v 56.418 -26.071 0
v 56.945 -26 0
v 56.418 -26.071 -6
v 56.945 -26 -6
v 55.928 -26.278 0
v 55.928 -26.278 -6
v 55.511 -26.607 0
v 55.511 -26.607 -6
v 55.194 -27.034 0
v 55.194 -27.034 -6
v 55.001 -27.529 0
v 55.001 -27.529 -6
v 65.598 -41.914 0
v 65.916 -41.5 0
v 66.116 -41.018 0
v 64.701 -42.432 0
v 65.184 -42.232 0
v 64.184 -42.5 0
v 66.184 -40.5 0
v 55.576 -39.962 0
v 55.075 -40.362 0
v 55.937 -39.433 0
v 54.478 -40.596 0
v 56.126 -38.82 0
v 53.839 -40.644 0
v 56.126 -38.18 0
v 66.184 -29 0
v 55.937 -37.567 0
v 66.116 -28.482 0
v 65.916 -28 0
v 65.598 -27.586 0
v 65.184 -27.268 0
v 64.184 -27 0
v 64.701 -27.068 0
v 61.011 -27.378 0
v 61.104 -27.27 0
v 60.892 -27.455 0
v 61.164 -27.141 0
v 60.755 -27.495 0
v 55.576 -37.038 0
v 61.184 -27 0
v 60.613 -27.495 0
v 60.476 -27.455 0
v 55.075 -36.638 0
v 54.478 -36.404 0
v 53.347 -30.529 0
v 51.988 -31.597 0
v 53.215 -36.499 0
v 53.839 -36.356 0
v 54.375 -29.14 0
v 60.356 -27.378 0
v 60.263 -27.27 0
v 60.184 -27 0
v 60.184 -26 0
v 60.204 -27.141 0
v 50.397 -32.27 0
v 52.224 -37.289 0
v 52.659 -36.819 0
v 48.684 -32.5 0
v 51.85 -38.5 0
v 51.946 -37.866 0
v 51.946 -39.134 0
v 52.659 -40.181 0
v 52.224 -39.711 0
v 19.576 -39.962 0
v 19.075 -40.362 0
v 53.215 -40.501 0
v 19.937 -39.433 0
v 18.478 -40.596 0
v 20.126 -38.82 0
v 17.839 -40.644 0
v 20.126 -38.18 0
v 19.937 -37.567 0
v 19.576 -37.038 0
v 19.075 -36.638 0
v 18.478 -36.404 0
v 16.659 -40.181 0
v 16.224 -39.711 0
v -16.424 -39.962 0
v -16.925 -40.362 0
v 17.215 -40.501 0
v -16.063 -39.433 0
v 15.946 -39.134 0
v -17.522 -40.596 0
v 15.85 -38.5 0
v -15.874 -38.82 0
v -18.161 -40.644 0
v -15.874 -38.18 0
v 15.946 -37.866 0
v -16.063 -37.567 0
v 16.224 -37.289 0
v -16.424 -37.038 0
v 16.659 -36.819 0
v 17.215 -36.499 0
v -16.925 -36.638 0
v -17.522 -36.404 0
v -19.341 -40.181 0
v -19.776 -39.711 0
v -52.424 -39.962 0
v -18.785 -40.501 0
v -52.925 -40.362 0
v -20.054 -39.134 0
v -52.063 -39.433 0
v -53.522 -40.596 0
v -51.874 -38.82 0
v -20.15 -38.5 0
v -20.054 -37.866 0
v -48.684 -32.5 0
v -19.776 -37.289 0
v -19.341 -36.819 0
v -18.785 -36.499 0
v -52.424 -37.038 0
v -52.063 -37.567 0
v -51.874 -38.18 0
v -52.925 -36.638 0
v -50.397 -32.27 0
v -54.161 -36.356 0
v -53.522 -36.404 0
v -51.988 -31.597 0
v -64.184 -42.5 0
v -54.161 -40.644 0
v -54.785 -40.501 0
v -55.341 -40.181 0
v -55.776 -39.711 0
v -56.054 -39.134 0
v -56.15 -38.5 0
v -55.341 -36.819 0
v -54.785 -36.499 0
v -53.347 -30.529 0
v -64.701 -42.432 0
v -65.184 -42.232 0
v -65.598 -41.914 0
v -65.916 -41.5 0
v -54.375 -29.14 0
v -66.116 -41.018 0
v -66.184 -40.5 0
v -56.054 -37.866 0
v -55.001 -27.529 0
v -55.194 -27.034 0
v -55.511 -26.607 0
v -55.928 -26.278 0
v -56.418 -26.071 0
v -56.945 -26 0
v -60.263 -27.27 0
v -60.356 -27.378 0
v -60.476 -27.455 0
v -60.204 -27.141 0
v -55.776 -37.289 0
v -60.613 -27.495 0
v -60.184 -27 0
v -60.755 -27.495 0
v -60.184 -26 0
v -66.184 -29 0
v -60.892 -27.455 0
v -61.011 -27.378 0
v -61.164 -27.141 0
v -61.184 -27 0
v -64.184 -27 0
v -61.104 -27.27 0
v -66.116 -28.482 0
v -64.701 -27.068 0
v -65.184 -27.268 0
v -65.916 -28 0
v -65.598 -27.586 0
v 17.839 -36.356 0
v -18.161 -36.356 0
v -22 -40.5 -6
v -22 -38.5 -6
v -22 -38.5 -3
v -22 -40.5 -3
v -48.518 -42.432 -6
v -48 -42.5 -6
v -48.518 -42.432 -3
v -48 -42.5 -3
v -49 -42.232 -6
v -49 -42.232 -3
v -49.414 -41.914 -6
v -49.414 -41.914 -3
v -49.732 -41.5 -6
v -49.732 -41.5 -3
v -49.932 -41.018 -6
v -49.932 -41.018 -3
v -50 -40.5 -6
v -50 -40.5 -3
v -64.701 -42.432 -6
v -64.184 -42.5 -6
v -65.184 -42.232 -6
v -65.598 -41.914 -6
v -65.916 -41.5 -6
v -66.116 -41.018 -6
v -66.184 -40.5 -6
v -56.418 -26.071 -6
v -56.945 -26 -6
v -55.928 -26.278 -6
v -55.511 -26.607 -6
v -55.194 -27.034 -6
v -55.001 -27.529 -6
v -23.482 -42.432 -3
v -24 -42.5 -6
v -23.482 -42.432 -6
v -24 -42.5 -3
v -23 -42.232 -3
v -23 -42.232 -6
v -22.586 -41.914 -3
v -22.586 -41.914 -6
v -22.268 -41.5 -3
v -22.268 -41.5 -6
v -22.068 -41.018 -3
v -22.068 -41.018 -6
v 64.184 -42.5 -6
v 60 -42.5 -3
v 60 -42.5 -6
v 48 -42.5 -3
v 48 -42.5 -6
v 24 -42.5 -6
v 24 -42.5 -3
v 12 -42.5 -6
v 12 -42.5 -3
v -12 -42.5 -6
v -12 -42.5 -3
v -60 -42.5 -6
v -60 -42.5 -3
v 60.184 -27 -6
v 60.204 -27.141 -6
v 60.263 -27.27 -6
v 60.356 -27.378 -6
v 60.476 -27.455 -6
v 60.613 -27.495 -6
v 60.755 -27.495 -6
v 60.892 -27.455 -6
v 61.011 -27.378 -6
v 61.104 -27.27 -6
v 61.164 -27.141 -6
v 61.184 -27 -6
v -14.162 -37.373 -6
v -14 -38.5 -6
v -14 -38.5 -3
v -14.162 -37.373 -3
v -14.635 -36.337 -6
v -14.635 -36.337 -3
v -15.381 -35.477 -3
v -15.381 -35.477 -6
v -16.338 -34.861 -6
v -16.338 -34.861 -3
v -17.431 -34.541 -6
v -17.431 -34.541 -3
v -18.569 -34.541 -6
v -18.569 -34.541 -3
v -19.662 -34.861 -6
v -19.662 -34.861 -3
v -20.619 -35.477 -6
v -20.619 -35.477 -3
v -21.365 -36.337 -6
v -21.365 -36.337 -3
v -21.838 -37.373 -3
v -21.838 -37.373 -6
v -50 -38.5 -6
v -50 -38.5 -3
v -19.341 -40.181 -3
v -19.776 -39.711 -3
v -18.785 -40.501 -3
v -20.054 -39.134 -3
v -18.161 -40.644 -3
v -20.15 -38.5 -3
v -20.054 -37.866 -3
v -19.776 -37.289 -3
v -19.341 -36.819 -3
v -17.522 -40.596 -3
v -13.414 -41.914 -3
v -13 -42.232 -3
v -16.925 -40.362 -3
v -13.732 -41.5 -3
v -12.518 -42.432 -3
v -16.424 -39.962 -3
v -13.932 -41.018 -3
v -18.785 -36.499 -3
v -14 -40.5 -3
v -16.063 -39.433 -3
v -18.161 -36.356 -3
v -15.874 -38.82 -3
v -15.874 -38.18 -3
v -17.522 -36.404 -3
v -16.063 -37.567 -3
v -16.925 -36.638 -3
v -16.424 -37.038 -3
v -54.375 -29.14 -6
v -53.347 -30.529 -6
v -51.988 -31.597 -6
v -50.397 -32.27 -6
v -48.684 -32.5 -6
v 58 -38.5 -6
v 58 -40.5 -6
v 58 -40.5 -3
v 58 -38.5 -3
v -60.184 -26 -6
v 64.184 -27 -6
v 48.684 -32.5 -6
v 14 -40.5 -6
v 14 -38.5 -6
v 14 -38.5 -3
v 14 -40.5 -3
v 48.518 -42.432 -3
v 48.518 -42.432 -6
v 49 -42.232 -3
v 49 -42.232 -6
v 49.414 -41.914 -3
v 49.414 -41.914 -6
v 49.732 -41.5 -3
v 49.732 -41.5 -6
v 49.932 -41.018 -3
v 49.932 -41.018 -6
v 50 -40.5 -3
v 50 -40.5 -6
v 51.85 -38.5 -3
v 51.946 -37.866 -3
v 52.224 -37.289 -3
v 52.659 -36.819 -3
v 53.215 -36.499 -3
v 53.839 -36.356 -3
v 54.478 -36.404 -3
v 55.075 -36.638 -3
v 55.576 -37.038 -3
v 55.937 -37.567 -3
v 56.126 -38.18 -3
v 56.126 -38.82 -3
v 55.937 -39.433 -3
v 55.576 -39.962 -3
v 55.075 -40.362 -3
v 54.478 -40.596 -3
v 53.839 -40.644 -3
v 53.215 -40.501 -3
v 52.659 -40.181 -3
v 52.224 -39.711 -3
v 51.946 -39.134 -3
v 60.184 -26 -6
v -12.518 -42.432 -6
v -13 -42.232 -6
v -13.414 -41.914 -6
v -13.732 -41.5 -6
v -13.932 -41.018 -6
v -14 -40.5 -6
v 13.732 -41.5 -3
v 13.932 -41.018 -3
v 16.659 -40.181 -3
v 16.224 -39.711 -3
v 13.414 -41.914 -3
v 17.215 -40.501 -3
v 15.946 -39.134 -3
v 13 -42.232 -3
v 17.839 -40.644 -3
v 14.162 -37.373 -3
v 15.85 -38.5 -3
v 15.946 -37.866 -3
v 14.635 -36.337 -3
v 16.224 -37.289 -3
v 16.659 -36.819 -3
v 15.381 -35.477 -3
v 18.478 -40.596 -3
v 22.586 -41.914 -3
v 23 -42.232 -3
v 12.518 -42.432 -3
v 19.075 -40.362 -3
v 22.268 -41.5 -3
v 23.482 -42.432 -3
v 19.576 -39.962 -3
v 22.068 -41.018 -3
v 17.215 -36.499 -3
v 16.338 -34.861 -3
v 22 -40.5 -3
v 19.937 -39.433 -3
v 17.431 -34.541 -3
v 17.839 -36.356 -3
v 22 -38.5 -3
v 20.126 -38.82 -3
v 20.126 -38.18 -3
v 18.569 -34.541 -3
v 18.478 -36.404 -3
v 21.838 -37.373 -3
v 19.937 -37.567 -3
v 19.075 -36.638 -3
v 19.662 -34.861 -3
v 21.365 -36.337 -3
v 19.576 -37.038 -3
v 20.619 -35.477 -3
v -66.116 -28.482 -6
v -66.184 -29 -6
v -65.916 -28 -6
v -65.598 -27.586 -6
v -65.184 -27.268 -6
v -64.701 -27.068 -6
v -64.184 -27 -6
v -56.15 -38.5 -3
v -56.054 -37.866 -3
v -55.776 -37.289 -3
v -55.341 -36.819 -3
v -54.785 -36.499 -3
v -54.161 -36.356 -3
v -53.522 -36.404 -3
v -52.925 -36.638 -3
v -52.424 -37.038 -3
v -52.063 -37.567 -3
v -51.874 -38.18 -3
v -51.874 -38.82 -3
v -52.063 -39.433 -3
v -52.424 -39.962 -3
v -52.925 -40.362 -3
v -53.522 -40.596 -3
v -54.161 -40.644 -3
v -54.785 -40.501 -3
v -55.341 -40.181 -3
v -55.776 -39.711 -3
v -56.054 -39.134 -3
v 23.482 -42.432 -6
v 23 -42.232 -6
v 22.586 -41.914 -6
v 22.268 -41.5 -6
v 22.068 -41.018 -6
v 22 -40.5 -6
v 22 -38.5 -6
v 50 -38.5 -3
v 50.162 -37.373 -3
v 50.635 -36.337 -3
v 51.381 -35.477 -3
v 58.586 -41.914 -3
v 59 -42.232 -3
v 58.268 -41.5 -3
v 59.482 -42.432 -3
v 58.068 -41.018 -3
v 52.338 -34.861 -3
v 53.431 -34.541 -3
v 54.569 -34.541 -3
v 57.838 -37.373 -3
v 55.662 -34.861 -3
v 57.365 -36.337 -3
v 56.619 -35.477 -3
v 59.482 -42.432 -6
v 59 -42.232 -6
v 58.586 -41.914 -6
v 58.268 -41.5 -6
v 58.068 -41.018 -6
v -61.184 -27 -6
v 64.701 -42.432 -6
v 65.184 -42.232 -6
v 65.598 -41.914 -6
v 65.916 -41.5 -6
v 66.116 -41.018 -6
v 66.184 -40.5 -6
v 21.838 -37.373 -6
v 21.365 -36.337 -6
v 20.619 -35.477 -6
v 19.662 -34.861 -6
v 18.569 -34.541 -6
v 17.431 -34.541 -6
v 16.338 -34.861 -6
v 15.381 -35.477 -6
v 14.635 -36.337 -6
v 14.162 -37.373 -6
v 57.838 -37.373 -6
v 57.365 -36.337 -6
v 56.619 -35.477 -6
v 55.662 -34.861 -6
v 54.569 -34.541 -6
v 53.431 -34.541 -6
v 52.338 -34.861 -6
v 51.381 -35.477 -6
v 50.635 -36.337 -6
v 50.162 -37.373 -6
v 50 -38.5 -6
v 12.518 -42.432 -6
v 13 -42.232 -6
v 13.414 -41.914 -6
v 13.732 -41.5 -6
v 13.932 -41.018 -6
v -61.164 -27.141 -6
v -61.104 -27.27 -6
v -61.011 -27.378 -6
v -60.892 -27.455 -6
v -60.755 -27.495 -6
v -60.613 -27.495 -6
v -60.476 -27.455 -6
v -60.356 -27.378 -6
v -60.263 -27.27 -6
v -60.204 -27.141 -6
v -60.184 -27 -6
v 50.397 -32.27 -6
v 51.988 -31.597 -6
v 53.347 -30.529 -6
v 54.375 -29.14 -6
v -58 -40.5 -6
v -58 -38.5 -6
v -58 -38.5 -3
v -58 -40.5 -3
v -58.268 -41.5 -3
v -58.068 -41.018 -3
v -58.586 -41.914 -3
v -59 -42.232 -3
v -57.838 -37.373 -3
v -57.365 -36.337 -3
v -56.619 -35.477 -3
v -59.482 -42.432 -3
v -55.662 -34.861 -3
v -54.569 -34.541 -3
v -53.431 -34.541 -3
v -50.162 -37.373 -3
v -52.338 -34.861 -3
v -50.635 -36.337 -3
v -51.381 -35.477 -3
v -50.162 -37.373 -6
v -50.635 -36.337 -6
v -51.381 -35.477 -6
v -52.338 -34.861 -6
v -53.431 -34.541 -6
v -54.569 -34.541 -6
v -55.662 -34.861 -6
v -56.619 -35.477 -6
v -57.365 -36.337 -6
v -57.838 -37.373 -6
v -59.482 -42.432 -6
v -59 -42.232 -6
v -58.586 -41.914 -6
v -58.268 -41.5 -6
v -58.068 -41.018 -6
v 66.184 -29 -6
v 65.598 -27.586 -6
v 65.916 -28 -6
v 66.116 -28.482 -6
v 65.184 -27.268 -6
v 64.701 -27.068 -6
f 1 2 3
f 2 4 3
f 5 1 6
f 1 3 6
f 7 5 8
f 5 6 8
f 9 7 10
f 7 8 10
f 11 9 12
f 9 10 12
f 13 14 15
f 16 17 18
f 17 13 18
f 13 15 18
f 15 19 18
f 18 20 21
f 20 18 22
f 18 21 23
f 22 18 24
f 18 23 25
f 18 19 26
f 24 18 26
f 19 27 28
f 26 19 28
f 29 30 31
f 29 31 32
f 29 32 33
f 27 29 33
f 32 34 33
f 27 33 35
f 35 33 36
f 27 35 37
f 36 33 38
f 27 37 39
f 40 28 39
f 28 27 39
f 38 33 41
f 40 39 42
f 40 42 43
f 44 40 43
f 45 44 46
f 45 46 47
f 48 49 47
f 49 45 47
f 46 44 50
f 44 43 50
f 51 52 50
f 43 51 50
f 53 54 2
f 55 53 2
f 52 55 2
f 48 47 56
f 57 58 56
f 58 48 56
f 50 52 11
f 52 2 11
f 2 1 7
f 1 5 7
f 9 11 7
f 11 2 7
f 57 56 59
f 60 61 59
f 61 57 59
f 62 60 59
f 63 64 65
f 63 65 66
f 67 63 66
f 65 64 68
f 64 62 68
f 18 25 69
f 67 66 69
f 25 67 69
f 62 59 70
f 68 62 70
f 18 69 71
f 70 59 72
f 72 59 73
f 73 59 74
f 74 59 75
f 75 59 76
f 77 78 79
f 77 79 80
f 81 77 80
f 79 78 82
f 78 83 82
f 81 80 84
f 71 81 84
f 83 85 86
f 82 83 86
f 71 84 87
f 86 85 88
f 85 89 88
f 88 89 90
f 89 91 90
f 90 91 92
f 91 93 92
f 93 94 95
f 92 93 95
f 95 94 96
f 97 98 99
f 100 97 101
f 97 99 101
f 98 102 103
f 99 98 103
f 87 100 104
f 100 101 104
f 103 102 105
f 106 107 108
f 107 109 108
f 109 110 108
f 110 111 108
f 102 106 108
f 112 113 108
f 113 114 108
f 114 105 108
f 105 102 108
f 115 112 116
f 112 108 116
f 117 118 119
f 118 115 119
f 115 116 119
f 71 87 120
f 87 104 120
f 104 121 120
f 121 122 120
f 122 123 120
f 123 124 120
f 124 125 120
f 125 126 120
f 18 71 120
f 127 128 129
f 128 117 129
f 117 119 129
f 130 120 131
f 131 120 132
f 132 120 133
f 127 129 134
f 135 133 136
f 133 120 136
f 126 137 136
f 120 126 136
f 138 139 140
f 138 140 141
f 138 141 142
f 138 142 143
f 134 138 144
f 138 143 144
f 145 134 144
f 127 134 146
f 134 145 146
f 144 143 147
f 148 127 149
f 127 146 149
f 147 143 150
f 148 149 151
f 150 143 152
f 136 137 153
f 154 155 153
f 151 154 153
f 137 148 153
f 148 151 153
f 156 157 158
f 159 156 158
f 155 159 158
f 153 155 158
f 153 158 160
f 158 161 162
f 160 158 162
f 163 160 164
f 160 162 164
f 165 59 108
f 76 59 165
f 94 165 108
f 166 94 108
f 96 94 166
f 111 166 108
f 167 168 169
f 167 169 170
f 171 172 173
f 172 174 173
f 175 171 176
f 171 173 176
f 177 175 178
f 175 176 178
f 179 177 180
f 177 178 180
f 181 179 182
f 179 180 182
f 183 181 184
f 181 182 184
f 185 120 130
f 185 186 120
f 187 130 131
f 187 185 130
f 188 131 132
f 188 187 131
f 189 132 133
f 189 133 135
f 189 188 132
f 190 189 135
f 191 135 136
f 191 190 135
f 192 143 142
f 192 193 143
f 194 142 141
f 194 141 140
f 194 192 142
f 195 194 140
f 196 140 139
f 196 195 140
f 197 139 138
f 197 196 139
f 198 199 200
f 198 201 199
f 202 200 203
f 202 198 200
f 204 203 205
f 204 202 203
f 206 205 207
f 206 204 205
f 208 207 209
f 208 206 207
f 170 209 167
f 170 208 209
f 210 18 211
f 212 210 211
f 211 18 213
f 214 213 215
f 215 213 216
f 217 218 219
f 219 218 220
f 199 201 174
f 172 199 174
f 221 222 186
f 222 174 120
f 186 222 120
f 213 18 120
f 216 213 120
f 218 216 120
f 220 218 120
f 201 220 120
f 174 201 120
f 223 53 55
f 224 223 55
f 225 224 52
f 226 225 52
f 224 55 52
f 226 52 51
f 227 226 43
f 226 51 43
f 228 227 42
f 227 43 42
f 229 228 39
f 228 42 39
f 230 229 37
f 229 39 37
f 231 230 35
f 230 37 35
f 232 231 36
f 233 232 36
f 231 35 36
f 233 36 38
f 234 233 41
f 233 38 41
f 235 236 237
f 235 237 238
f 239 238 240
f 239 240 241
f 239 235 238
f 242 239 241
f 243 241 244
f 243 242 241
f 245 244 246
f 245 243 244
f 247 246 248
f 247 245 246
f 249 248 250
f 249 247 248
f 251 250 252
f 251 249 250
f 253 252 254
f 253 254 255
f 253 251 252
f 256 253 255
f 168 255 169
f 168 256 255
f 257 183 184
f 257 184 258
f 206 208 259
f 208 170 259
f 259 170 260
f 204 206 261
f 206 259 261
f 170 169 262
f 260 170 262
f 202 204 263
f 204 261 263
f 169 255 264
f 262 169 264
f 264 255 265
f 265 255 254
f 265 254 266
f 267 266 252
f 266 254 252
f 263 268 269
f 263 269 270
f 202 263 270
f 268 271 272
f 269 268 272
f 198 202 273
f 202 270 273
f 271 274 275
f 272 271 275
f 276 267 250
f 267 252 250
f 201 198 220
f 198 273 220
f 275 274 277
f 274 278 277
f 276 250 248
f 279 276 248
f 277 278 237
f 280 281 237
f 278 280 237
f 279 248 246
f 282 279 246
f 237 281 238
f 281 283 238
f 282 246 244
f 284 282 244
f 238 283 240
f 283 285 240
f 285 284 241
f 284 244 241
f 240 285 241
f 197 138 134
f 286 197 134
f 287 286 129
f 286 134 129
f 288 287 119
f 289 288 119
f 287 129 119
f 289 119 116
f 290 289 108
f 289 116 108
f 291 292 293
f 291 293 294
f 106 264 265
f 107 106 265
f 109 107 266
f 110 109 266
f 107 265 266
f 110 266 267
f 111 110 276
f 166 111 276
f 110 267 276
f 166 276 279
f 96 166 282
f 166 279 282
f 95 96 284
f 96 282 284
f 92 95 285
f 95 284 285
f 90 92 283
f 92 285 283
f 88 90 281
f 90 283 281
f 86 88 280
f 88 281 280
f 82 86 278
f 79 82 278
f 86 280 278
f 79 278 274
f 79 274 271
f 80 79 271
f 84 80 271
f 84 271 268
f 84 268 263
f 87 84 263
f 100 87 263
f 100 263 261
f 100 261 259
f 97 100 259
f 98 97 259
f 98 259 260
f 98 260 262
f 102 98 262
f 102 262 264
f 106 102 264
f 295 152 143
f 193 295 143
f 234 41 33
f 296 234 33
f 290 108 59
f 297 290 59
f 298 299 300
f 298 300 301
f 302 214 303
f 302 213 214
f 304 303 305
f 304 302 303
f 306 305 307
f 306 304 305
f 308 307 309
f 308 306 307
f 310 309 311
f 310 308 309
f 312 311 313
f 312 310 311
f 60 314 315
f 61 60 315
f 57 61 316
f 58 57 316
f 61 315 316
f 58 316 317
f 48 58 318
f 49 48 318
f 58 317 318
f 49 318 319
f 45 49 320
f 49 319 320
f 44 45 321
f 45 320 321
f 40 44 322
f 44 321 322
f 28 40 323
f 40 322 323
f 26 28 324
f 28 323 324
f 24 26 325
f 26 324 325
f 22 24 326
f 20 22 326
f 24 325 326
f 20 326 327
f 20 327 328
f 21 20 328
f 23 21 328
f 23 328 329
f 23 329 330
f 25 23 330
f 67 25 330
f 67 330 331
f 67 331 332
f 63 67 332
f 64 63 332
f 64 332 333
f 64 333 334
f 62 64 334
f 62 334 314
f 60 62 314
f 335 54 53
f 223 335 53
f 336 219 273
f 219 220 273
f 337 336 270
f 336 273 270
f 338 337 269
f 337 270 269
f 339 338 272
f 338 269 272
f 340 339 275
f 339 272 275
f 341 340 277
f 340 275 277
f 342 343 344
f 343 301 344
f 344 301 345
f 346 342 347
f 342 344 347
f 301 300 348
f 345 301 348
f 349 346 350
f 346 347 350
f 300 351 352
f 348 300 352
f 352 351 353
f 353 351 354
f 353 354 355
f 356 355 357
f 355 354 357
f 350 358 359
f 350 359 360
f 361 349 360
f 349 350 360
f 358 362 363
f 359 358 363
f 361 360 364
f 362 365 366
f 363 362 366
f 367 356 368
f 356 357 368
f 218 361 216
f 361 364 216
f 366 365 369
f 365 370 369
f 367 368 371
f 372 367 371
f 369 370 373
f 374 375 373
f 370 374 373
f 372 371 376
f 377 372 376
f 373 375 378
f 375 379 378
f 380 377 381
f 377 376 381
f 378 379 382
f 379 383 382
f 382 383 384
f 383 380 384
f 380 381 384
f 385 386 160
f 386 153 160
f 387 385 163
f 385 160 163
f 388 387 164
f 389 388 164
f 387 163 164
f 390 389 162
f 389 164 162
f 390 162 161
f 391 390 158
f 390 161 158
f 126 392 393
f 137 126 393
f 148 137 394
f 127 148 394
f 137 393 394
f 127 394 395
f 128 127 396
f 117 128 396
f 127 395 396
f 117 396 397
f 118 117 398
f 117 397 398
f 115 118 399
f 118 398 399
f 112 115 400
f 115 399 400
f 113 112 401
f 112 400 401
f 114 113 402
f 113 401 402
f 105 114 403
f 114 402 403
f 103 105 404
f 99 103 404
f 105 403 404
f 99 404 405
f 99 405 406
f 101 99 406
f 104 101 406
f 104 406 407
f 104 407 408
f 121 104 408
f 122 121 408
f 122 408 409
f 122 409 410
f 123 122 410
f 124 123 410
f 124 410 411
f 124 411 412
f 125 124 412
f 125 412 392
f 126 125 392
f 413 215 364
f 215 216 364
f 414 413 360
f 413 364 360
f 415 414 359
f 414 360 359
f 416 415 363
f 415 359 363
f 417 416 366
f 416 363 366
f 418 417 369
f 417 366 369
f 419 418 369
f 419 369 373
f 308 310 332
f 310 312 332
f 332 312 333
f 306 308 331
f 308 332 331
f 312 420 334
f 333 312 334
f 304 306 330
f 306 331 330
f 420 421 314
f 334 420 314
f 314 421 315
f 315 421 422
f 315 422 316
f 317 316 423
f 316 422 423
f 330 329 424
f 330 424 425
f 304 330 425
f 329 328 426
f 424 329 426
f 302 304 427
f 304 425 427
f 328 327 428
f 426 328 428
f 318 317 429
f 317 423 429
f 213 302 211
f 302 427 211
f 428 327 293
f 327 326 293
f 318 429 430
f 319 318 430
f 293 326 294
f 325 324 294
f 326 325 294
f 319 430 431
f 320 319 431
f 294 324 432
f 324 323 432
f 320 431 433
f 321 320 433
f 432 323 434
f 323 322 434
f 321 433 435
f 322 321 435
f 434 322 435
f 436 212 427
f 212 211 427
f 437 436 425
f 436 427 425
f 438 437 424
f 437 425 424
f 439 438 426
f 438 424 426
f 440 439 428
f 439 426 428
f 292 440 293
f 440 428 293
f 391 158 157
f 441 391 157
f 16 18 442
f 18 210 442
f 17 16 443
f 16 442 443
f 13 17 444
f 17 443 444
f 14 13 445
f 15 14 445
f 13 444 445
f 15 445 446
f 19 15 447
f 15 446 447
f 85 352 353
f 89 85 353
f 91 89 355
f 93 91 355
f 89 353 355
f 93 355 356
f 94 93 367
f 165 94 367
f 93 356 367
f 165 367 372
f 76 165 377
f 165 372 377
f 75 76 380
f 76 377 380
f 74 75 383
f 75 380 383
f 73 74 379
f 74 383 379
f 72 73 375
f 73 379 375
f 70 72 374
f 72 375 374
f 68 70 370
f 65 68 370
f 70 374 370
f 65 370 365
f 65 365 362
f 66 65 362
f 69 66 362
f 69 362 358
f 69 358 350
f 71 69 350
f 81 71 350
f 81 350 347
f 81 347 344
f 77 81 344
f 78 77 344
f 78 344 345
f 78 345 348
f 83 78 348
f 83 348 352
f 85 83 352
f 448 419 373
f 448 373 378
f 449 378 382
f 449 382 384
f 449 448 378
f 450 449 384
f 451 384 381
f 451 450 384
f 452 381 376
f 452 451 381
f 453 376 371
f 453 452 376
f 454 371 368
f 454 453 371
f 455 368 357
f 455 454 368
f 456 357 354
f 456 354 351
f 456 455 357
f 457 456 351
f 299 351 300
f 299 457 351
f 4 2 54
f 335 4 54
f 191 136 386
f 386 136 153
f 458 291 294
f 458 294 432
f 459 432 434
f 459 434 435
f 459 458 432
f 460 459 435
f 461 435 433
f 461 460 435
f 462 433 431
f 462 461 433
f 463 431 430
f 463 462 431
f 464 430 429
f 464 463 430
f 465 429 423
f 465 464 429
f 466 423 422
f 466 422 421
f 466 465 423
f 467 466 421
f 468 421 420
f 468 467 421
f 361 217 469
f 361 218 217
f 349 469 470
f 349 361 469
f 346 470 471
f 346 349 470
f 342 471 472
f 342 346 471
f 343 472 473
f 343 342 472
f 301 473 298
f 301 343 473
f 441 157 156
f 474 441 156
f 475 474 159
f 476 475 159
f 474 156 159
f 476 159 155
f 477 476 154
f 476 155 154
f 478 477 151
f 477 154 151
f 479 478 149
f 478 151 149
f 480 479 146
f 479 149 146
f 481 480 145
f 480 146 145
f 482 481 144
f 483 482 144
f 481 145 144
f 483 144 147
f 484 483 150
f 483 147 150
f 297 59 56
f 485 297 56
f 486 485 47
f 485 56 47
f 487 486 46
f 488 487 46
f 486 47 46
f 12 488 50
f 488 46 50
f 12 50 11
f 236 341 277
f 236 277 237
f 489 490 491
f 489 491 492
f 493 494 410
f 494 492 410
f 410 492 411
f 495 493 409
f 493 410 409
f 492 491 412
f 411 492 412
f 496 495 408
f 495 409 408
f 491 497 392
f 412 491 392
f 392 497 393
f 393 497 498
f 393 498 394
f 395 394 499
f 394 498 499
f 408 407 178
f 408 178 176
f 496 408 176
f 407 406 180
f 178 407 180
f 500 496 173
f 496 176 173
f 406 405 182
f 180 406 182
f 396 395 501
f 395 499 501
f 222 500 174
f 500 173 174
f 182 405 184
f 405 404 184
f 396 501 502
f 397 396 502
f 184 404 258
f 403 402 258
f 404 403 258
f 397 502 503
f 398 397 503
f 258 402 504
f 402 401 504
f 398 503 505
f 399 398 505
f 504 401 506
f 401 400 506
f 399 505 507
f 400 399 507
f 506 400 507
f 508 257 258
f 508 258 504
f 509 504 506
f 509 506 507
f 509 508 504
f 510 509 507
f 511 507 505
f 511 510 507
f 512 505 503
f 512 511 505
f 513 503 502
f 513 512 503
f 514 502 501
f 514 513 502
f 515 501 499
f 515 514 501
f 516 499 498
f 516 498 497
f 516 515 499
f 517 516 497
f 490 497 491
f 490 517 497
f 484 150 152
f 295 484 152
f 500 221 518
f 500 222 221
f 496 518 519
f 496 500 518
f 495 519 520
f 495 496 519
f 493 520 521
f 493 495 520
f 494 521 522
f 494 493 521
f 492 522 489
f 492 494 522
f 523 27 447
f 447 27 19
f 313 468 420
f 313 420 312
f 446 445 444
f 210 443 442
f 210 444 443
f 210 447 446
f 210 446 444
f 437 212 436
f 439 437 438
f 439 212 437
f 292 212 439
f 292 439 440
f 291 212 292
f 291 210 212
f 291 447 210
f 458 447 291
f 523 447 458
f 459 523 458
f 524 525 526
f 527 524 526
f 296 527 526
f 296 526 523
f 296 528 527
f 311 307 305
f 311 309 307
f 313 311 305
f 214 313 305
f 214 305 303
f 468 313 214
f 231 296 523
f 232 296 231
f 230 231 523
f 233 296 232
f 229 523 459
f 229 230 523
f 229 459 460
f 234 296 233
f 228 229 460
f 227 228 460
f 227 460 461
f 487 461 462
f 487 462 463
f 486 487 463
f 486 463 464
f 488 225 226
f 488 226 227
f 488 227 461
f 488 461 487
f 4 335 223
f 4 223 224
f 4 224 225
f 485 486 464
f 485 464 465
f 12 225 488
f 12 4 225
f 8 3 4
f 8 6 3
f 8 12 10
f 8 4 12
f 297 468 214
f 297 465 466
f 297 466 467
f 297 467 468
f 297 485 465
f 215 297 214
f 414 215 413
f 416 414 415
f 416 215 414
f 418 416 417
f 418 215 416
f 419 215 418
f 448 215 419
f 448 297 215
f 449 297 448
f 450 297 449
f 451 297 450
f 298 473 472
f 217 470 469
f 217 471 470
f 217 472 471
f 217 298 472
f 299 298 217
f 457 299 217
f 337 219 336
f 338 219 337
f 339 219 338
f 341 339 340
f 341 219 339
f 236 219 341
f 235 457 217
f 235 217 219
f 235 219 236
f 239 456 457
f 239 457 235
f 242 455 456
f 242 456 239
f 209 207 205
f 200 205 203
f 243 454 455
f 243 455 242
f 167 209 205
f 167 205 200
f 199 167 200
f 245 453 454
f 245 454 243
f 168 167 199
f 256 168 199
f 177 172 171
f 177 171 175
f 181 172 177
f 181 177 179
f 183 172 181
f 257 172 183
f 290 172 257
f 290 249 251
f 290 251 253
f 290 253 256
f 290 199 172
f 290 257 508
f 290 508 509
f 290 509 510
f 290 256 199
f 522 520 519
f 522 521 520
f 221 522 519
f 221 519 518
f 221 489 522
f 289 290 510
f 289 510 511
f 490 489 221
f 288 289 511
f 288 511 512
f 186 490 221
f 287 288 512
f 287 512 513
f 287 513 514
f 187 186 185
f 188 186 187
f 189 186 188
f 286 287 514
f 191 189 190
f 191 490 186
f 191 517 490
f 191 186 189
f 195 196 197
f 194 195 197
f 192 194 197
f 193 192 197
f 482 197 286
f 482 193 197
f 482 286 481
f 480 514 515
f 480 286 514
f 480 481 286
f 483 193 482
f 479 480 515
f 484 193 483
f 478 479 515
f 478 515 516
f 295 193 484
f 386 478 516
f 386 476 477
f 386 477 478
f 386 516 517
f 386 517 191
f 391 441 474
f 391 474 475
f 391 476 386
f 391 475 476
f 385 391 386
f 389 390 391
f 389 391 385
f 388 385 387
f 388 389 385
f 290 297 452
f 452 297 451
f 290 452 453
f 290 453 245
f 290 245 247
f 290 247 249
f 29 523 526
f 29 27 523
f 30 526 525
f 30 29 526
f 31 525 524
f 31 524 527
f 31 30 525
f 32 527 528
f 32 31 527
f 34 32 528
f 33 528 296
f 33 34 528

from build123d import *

# Parameters (mm, degrees)
EXTRUDE_1_DEPTH     = 6
CUT_EXTRUDE_START   = -6
CUT_EXTRUDE_1_DEPTH = 1
CUT_EXTRUDE_3_DEPTH = 3
SKETCH_5_OUTSIDE_W  = 281.366
SKETCH_5_OUTSIDE_H  = 83.498
CUT_EXTRUDE_2_DEPTH = 124.858535656
HOLE_WIZARD_M4_1_D  = 4.3
FILLET_3_R          = 2


with BuildPart() as part:
    # ｽｹｯﾁ1 → ﾎﾞｽ - 押し出し1 (new body)
    with BuildSketch(Plane.XY):
        with BuildLine():
            Line((-74.445215618, -8), (-65.183849372, -8))
            ThreePointArc((-65.183849372, -8), (-59.472431605, -21.788582233), (-45.683849372, -27.5))
            Line((-45.683849372, -27.5), (45.683849372, -27.5))
            ThreePointArc((45.683849372, -27.5), (59.472431605, -21.788582233), (65.183849372, -8))
            Line((65.183849372, -8), (74.445215618, -8))
            ThreePointArc((74.445215618, -8), (83.886790831, -21.023796042), (99.183849372, -26))
            Line((99.183849372, -26), (116.183849372, -26))
            Line((116.183849372, -26), (116.183849372, -34))
            Line((116.183849372, -34), (66.183849372, -42.5))
            Line((66.183849372, -42.5), (-66.183849372, -42.5))
            Line((-66.183849372, -42.5), (-116.183849372, -34))
            Line((-116.183849372, -34), (-116.183849372, -26))
            Line((-116.183849372, -26), (-99.183849372, -26))
            ThreePointArc((-99.183849372, -26), (-83.886790831, -21.023796042), (-74.445215618, -8))
        make_face()
    extrude(amount=-EXTRUDE_1_DEPTH)

    # ｽｹｯﾁ1<5> → ｶｯﾄ - 押し出し1 (cut)
    with BuildSketch(Plane.XY.offset(CUT_EXTRUDE_START)):
        with BuildLine():
            Line((-66.183849372, -8), (-72.183849372, -8))
            Line((-72.183849372, -8), (-72.183849372, -27))
            Line((-72.183849372, -27), (-116.183849372, -27))
            Line((-116.183849372, -27), (-116.183849372, -33))
            Line((-116.183849372, -33), (-72.183849372, -33))
            Line((-72.183849372, -33), (-72.183849372, -34))
            ThreePointArc((-72.183849372, -34), (-71.183849372, -35), (-70.183849372, -34))
            Line((-70.183849372, -34), (-68.183849372, -34))
            ThreePointArc((-68.183849372, -34), (-67.183849372, -35), (-66.183849372, -34))
            Line((-66.183849372, -34), (-66.183849372, -8))
        make_face()
        with BuildLine():
            Line((72.183849372, -8), (66.183849372, -8))
            Line((66.183849372, -8), (66.183849372, -34))
            ThreePointArc((66.183849372, -34), (67.183849372, -35), (68.183849372, -34))
            Line((68.183849372, -34), (70.183849372, -34))
            ThreePointArc((70.183849372, -34), (71.183849372, -35), (72.183849372, -34))
            Line((72.183849372, -34), (72.183849372, -33))
            Line((72.183849372, -33), (116.183849372, -33))
            Line((116.183849372, -33), (116.183849372, -27))
            Line((116.183849372, -27), (72.183849372, -27))
            Line((72.183849372, -27), (72.183849372, -8))
        make_face()
    extrude(amount=CUT_EXTRUDE_1_DEPTH, mode=Mode.SUBTRACT)

    # ｽｹｯﾁ1<6> → ｶｯﾄ - 押し出し3 (cut)
    with BuildSketch(Plane.XY.offset(CUT_EXTRUDE_START)):
        with BuildLine():
            Line((-58, -38.5), (-58, -42.5))
            Line((-58, -42.5), (-50, -42.5))
            Line((-50, -42.5), (-50, -38.5))
            ThreePointArc((-50, -38.5), (-54, -34.5), (-58, -38.5))
        make_face()
        with BuildLine():
            Line((-22, -38.5), (-22, -42.5))
            Line((-22, -42.5), (-14, -42.5))
            Line((-14, -42.5), (-14, -38.5))
            ThreePointArc((-14, -38.5), (-18, -34.5), (-22, -38.5))
        make_face()
        with BuildLine():
            Line((14, -38.5), (14, -42.5))
            Line((14, -42.5), (22, -42.5))
            Line((22, -42.5), (22, -38.5))
            ThreePointArc((22, -38.5), (18, -34.5), (14, -38.5))
        make_face()
        with BuildLine():
            Line((50, -38.5), (50, -42.5))
            Line((50, -42.5), (58, -42.5))
            Line((58, -42.5), (58, -38.5))
            ThreePointArc((58, -38.5), (54, -34.5), (50, -38.5))
        make_face()
    extrude(amount=CUT_EXTRUDE_3_DEPTH, mode=Mode.SUBTRACT)

    # ｽｹｯﾁ5 outside → ｶｯﾄ - 押し出し2 (cut, through all)
    with BuildSketch(Plane.XY):
        with Locations((0, -25.25)):
            Rectangle(SKETCH_5_OUTSIDE_W, SKETCH_5_OUTSIDE_H)
        with BuildLine():
            Line((-66.183849372, -27), (-61.183849372, -27))
            ThreePointArc((-61.183849372, -27), (-60.683849372, -27.5), (-60.183849372, -27))
            Line((-60.183849372, -27), (-60.183849372, -26))
            Line((-60.183849372, -26), (-55.183849372, -26))
            ThreePointArc((-55.183849372, -26), (-53.28004345, -30.596194078), (-48.683849372, -32.5))
            Line((-48.683849372, -32.5), (48.683849372, -32.5))
            ThreePointArc((48.683849372, -32.5), (53.28004345, -30.596194078), (55.183849372, -26))
            Line((55.183849372, -26), (60.183849372, -26))
            Line((60.183849372, -26), (60.183849372, -27))
            ThreePointArc((60.183849372, -27), (60.683849372, -27.5), (61.183849372, -27))
            Line((61.183849372, -27), (66.183849372, -27))
            Line((66.183849372, -27), (66.183849372, -42.5))
            Line((66.183849372, -42.5), (-66.183849372, -42.5))
            Line((-66.183849372, -42.5), (-66.183849372, -27))
        make_face(mode=Mode.SUBTRACT)
    extrude(amount=-CUT_EXTRUDE_2_DEPTH, mode=Mode.SUBTRACT)

    # M4 すきま穴1 (through all)
    with Locations(Plane(origin=(-54, -38.5, 0), x_dir=(1, 0, 0), z_dir=(0, 0, 1))):
        with Locations((0, 0), (36, 0), (72, 0), (108, 0)):
            Hole(HOLE_WIZARD_M4_1_D / 2)

    # ﾌｨﾚｯﾄ3
    fillet_3_edges = [part.edges().sort_by_distance(p)[0] for p in [
        (-58, -42.5, -4.5),
        (-50, -42.5, -4.5),
        (-22, -42.5, -4.5),
        (-14, -42.5, -4.5),
        (14, -42.5, -4.5),
        (22, -42.5, -4.5),
        (50, -42.5, -4.5),
        (58, -42.5, -4.5),
        (-66.183849372, -27, -3),
        (-55.183849372, -26, -3),
        (55.183849372, -26, -3),
        (66.183849372, -27, -3),
        (-66.183849372, -42.5, -3),
        (66.183849372, -42.5, -3),
    ]]
    fillet(fillet_3_edges, radius=FILLET_3_R)


solid = part.part
